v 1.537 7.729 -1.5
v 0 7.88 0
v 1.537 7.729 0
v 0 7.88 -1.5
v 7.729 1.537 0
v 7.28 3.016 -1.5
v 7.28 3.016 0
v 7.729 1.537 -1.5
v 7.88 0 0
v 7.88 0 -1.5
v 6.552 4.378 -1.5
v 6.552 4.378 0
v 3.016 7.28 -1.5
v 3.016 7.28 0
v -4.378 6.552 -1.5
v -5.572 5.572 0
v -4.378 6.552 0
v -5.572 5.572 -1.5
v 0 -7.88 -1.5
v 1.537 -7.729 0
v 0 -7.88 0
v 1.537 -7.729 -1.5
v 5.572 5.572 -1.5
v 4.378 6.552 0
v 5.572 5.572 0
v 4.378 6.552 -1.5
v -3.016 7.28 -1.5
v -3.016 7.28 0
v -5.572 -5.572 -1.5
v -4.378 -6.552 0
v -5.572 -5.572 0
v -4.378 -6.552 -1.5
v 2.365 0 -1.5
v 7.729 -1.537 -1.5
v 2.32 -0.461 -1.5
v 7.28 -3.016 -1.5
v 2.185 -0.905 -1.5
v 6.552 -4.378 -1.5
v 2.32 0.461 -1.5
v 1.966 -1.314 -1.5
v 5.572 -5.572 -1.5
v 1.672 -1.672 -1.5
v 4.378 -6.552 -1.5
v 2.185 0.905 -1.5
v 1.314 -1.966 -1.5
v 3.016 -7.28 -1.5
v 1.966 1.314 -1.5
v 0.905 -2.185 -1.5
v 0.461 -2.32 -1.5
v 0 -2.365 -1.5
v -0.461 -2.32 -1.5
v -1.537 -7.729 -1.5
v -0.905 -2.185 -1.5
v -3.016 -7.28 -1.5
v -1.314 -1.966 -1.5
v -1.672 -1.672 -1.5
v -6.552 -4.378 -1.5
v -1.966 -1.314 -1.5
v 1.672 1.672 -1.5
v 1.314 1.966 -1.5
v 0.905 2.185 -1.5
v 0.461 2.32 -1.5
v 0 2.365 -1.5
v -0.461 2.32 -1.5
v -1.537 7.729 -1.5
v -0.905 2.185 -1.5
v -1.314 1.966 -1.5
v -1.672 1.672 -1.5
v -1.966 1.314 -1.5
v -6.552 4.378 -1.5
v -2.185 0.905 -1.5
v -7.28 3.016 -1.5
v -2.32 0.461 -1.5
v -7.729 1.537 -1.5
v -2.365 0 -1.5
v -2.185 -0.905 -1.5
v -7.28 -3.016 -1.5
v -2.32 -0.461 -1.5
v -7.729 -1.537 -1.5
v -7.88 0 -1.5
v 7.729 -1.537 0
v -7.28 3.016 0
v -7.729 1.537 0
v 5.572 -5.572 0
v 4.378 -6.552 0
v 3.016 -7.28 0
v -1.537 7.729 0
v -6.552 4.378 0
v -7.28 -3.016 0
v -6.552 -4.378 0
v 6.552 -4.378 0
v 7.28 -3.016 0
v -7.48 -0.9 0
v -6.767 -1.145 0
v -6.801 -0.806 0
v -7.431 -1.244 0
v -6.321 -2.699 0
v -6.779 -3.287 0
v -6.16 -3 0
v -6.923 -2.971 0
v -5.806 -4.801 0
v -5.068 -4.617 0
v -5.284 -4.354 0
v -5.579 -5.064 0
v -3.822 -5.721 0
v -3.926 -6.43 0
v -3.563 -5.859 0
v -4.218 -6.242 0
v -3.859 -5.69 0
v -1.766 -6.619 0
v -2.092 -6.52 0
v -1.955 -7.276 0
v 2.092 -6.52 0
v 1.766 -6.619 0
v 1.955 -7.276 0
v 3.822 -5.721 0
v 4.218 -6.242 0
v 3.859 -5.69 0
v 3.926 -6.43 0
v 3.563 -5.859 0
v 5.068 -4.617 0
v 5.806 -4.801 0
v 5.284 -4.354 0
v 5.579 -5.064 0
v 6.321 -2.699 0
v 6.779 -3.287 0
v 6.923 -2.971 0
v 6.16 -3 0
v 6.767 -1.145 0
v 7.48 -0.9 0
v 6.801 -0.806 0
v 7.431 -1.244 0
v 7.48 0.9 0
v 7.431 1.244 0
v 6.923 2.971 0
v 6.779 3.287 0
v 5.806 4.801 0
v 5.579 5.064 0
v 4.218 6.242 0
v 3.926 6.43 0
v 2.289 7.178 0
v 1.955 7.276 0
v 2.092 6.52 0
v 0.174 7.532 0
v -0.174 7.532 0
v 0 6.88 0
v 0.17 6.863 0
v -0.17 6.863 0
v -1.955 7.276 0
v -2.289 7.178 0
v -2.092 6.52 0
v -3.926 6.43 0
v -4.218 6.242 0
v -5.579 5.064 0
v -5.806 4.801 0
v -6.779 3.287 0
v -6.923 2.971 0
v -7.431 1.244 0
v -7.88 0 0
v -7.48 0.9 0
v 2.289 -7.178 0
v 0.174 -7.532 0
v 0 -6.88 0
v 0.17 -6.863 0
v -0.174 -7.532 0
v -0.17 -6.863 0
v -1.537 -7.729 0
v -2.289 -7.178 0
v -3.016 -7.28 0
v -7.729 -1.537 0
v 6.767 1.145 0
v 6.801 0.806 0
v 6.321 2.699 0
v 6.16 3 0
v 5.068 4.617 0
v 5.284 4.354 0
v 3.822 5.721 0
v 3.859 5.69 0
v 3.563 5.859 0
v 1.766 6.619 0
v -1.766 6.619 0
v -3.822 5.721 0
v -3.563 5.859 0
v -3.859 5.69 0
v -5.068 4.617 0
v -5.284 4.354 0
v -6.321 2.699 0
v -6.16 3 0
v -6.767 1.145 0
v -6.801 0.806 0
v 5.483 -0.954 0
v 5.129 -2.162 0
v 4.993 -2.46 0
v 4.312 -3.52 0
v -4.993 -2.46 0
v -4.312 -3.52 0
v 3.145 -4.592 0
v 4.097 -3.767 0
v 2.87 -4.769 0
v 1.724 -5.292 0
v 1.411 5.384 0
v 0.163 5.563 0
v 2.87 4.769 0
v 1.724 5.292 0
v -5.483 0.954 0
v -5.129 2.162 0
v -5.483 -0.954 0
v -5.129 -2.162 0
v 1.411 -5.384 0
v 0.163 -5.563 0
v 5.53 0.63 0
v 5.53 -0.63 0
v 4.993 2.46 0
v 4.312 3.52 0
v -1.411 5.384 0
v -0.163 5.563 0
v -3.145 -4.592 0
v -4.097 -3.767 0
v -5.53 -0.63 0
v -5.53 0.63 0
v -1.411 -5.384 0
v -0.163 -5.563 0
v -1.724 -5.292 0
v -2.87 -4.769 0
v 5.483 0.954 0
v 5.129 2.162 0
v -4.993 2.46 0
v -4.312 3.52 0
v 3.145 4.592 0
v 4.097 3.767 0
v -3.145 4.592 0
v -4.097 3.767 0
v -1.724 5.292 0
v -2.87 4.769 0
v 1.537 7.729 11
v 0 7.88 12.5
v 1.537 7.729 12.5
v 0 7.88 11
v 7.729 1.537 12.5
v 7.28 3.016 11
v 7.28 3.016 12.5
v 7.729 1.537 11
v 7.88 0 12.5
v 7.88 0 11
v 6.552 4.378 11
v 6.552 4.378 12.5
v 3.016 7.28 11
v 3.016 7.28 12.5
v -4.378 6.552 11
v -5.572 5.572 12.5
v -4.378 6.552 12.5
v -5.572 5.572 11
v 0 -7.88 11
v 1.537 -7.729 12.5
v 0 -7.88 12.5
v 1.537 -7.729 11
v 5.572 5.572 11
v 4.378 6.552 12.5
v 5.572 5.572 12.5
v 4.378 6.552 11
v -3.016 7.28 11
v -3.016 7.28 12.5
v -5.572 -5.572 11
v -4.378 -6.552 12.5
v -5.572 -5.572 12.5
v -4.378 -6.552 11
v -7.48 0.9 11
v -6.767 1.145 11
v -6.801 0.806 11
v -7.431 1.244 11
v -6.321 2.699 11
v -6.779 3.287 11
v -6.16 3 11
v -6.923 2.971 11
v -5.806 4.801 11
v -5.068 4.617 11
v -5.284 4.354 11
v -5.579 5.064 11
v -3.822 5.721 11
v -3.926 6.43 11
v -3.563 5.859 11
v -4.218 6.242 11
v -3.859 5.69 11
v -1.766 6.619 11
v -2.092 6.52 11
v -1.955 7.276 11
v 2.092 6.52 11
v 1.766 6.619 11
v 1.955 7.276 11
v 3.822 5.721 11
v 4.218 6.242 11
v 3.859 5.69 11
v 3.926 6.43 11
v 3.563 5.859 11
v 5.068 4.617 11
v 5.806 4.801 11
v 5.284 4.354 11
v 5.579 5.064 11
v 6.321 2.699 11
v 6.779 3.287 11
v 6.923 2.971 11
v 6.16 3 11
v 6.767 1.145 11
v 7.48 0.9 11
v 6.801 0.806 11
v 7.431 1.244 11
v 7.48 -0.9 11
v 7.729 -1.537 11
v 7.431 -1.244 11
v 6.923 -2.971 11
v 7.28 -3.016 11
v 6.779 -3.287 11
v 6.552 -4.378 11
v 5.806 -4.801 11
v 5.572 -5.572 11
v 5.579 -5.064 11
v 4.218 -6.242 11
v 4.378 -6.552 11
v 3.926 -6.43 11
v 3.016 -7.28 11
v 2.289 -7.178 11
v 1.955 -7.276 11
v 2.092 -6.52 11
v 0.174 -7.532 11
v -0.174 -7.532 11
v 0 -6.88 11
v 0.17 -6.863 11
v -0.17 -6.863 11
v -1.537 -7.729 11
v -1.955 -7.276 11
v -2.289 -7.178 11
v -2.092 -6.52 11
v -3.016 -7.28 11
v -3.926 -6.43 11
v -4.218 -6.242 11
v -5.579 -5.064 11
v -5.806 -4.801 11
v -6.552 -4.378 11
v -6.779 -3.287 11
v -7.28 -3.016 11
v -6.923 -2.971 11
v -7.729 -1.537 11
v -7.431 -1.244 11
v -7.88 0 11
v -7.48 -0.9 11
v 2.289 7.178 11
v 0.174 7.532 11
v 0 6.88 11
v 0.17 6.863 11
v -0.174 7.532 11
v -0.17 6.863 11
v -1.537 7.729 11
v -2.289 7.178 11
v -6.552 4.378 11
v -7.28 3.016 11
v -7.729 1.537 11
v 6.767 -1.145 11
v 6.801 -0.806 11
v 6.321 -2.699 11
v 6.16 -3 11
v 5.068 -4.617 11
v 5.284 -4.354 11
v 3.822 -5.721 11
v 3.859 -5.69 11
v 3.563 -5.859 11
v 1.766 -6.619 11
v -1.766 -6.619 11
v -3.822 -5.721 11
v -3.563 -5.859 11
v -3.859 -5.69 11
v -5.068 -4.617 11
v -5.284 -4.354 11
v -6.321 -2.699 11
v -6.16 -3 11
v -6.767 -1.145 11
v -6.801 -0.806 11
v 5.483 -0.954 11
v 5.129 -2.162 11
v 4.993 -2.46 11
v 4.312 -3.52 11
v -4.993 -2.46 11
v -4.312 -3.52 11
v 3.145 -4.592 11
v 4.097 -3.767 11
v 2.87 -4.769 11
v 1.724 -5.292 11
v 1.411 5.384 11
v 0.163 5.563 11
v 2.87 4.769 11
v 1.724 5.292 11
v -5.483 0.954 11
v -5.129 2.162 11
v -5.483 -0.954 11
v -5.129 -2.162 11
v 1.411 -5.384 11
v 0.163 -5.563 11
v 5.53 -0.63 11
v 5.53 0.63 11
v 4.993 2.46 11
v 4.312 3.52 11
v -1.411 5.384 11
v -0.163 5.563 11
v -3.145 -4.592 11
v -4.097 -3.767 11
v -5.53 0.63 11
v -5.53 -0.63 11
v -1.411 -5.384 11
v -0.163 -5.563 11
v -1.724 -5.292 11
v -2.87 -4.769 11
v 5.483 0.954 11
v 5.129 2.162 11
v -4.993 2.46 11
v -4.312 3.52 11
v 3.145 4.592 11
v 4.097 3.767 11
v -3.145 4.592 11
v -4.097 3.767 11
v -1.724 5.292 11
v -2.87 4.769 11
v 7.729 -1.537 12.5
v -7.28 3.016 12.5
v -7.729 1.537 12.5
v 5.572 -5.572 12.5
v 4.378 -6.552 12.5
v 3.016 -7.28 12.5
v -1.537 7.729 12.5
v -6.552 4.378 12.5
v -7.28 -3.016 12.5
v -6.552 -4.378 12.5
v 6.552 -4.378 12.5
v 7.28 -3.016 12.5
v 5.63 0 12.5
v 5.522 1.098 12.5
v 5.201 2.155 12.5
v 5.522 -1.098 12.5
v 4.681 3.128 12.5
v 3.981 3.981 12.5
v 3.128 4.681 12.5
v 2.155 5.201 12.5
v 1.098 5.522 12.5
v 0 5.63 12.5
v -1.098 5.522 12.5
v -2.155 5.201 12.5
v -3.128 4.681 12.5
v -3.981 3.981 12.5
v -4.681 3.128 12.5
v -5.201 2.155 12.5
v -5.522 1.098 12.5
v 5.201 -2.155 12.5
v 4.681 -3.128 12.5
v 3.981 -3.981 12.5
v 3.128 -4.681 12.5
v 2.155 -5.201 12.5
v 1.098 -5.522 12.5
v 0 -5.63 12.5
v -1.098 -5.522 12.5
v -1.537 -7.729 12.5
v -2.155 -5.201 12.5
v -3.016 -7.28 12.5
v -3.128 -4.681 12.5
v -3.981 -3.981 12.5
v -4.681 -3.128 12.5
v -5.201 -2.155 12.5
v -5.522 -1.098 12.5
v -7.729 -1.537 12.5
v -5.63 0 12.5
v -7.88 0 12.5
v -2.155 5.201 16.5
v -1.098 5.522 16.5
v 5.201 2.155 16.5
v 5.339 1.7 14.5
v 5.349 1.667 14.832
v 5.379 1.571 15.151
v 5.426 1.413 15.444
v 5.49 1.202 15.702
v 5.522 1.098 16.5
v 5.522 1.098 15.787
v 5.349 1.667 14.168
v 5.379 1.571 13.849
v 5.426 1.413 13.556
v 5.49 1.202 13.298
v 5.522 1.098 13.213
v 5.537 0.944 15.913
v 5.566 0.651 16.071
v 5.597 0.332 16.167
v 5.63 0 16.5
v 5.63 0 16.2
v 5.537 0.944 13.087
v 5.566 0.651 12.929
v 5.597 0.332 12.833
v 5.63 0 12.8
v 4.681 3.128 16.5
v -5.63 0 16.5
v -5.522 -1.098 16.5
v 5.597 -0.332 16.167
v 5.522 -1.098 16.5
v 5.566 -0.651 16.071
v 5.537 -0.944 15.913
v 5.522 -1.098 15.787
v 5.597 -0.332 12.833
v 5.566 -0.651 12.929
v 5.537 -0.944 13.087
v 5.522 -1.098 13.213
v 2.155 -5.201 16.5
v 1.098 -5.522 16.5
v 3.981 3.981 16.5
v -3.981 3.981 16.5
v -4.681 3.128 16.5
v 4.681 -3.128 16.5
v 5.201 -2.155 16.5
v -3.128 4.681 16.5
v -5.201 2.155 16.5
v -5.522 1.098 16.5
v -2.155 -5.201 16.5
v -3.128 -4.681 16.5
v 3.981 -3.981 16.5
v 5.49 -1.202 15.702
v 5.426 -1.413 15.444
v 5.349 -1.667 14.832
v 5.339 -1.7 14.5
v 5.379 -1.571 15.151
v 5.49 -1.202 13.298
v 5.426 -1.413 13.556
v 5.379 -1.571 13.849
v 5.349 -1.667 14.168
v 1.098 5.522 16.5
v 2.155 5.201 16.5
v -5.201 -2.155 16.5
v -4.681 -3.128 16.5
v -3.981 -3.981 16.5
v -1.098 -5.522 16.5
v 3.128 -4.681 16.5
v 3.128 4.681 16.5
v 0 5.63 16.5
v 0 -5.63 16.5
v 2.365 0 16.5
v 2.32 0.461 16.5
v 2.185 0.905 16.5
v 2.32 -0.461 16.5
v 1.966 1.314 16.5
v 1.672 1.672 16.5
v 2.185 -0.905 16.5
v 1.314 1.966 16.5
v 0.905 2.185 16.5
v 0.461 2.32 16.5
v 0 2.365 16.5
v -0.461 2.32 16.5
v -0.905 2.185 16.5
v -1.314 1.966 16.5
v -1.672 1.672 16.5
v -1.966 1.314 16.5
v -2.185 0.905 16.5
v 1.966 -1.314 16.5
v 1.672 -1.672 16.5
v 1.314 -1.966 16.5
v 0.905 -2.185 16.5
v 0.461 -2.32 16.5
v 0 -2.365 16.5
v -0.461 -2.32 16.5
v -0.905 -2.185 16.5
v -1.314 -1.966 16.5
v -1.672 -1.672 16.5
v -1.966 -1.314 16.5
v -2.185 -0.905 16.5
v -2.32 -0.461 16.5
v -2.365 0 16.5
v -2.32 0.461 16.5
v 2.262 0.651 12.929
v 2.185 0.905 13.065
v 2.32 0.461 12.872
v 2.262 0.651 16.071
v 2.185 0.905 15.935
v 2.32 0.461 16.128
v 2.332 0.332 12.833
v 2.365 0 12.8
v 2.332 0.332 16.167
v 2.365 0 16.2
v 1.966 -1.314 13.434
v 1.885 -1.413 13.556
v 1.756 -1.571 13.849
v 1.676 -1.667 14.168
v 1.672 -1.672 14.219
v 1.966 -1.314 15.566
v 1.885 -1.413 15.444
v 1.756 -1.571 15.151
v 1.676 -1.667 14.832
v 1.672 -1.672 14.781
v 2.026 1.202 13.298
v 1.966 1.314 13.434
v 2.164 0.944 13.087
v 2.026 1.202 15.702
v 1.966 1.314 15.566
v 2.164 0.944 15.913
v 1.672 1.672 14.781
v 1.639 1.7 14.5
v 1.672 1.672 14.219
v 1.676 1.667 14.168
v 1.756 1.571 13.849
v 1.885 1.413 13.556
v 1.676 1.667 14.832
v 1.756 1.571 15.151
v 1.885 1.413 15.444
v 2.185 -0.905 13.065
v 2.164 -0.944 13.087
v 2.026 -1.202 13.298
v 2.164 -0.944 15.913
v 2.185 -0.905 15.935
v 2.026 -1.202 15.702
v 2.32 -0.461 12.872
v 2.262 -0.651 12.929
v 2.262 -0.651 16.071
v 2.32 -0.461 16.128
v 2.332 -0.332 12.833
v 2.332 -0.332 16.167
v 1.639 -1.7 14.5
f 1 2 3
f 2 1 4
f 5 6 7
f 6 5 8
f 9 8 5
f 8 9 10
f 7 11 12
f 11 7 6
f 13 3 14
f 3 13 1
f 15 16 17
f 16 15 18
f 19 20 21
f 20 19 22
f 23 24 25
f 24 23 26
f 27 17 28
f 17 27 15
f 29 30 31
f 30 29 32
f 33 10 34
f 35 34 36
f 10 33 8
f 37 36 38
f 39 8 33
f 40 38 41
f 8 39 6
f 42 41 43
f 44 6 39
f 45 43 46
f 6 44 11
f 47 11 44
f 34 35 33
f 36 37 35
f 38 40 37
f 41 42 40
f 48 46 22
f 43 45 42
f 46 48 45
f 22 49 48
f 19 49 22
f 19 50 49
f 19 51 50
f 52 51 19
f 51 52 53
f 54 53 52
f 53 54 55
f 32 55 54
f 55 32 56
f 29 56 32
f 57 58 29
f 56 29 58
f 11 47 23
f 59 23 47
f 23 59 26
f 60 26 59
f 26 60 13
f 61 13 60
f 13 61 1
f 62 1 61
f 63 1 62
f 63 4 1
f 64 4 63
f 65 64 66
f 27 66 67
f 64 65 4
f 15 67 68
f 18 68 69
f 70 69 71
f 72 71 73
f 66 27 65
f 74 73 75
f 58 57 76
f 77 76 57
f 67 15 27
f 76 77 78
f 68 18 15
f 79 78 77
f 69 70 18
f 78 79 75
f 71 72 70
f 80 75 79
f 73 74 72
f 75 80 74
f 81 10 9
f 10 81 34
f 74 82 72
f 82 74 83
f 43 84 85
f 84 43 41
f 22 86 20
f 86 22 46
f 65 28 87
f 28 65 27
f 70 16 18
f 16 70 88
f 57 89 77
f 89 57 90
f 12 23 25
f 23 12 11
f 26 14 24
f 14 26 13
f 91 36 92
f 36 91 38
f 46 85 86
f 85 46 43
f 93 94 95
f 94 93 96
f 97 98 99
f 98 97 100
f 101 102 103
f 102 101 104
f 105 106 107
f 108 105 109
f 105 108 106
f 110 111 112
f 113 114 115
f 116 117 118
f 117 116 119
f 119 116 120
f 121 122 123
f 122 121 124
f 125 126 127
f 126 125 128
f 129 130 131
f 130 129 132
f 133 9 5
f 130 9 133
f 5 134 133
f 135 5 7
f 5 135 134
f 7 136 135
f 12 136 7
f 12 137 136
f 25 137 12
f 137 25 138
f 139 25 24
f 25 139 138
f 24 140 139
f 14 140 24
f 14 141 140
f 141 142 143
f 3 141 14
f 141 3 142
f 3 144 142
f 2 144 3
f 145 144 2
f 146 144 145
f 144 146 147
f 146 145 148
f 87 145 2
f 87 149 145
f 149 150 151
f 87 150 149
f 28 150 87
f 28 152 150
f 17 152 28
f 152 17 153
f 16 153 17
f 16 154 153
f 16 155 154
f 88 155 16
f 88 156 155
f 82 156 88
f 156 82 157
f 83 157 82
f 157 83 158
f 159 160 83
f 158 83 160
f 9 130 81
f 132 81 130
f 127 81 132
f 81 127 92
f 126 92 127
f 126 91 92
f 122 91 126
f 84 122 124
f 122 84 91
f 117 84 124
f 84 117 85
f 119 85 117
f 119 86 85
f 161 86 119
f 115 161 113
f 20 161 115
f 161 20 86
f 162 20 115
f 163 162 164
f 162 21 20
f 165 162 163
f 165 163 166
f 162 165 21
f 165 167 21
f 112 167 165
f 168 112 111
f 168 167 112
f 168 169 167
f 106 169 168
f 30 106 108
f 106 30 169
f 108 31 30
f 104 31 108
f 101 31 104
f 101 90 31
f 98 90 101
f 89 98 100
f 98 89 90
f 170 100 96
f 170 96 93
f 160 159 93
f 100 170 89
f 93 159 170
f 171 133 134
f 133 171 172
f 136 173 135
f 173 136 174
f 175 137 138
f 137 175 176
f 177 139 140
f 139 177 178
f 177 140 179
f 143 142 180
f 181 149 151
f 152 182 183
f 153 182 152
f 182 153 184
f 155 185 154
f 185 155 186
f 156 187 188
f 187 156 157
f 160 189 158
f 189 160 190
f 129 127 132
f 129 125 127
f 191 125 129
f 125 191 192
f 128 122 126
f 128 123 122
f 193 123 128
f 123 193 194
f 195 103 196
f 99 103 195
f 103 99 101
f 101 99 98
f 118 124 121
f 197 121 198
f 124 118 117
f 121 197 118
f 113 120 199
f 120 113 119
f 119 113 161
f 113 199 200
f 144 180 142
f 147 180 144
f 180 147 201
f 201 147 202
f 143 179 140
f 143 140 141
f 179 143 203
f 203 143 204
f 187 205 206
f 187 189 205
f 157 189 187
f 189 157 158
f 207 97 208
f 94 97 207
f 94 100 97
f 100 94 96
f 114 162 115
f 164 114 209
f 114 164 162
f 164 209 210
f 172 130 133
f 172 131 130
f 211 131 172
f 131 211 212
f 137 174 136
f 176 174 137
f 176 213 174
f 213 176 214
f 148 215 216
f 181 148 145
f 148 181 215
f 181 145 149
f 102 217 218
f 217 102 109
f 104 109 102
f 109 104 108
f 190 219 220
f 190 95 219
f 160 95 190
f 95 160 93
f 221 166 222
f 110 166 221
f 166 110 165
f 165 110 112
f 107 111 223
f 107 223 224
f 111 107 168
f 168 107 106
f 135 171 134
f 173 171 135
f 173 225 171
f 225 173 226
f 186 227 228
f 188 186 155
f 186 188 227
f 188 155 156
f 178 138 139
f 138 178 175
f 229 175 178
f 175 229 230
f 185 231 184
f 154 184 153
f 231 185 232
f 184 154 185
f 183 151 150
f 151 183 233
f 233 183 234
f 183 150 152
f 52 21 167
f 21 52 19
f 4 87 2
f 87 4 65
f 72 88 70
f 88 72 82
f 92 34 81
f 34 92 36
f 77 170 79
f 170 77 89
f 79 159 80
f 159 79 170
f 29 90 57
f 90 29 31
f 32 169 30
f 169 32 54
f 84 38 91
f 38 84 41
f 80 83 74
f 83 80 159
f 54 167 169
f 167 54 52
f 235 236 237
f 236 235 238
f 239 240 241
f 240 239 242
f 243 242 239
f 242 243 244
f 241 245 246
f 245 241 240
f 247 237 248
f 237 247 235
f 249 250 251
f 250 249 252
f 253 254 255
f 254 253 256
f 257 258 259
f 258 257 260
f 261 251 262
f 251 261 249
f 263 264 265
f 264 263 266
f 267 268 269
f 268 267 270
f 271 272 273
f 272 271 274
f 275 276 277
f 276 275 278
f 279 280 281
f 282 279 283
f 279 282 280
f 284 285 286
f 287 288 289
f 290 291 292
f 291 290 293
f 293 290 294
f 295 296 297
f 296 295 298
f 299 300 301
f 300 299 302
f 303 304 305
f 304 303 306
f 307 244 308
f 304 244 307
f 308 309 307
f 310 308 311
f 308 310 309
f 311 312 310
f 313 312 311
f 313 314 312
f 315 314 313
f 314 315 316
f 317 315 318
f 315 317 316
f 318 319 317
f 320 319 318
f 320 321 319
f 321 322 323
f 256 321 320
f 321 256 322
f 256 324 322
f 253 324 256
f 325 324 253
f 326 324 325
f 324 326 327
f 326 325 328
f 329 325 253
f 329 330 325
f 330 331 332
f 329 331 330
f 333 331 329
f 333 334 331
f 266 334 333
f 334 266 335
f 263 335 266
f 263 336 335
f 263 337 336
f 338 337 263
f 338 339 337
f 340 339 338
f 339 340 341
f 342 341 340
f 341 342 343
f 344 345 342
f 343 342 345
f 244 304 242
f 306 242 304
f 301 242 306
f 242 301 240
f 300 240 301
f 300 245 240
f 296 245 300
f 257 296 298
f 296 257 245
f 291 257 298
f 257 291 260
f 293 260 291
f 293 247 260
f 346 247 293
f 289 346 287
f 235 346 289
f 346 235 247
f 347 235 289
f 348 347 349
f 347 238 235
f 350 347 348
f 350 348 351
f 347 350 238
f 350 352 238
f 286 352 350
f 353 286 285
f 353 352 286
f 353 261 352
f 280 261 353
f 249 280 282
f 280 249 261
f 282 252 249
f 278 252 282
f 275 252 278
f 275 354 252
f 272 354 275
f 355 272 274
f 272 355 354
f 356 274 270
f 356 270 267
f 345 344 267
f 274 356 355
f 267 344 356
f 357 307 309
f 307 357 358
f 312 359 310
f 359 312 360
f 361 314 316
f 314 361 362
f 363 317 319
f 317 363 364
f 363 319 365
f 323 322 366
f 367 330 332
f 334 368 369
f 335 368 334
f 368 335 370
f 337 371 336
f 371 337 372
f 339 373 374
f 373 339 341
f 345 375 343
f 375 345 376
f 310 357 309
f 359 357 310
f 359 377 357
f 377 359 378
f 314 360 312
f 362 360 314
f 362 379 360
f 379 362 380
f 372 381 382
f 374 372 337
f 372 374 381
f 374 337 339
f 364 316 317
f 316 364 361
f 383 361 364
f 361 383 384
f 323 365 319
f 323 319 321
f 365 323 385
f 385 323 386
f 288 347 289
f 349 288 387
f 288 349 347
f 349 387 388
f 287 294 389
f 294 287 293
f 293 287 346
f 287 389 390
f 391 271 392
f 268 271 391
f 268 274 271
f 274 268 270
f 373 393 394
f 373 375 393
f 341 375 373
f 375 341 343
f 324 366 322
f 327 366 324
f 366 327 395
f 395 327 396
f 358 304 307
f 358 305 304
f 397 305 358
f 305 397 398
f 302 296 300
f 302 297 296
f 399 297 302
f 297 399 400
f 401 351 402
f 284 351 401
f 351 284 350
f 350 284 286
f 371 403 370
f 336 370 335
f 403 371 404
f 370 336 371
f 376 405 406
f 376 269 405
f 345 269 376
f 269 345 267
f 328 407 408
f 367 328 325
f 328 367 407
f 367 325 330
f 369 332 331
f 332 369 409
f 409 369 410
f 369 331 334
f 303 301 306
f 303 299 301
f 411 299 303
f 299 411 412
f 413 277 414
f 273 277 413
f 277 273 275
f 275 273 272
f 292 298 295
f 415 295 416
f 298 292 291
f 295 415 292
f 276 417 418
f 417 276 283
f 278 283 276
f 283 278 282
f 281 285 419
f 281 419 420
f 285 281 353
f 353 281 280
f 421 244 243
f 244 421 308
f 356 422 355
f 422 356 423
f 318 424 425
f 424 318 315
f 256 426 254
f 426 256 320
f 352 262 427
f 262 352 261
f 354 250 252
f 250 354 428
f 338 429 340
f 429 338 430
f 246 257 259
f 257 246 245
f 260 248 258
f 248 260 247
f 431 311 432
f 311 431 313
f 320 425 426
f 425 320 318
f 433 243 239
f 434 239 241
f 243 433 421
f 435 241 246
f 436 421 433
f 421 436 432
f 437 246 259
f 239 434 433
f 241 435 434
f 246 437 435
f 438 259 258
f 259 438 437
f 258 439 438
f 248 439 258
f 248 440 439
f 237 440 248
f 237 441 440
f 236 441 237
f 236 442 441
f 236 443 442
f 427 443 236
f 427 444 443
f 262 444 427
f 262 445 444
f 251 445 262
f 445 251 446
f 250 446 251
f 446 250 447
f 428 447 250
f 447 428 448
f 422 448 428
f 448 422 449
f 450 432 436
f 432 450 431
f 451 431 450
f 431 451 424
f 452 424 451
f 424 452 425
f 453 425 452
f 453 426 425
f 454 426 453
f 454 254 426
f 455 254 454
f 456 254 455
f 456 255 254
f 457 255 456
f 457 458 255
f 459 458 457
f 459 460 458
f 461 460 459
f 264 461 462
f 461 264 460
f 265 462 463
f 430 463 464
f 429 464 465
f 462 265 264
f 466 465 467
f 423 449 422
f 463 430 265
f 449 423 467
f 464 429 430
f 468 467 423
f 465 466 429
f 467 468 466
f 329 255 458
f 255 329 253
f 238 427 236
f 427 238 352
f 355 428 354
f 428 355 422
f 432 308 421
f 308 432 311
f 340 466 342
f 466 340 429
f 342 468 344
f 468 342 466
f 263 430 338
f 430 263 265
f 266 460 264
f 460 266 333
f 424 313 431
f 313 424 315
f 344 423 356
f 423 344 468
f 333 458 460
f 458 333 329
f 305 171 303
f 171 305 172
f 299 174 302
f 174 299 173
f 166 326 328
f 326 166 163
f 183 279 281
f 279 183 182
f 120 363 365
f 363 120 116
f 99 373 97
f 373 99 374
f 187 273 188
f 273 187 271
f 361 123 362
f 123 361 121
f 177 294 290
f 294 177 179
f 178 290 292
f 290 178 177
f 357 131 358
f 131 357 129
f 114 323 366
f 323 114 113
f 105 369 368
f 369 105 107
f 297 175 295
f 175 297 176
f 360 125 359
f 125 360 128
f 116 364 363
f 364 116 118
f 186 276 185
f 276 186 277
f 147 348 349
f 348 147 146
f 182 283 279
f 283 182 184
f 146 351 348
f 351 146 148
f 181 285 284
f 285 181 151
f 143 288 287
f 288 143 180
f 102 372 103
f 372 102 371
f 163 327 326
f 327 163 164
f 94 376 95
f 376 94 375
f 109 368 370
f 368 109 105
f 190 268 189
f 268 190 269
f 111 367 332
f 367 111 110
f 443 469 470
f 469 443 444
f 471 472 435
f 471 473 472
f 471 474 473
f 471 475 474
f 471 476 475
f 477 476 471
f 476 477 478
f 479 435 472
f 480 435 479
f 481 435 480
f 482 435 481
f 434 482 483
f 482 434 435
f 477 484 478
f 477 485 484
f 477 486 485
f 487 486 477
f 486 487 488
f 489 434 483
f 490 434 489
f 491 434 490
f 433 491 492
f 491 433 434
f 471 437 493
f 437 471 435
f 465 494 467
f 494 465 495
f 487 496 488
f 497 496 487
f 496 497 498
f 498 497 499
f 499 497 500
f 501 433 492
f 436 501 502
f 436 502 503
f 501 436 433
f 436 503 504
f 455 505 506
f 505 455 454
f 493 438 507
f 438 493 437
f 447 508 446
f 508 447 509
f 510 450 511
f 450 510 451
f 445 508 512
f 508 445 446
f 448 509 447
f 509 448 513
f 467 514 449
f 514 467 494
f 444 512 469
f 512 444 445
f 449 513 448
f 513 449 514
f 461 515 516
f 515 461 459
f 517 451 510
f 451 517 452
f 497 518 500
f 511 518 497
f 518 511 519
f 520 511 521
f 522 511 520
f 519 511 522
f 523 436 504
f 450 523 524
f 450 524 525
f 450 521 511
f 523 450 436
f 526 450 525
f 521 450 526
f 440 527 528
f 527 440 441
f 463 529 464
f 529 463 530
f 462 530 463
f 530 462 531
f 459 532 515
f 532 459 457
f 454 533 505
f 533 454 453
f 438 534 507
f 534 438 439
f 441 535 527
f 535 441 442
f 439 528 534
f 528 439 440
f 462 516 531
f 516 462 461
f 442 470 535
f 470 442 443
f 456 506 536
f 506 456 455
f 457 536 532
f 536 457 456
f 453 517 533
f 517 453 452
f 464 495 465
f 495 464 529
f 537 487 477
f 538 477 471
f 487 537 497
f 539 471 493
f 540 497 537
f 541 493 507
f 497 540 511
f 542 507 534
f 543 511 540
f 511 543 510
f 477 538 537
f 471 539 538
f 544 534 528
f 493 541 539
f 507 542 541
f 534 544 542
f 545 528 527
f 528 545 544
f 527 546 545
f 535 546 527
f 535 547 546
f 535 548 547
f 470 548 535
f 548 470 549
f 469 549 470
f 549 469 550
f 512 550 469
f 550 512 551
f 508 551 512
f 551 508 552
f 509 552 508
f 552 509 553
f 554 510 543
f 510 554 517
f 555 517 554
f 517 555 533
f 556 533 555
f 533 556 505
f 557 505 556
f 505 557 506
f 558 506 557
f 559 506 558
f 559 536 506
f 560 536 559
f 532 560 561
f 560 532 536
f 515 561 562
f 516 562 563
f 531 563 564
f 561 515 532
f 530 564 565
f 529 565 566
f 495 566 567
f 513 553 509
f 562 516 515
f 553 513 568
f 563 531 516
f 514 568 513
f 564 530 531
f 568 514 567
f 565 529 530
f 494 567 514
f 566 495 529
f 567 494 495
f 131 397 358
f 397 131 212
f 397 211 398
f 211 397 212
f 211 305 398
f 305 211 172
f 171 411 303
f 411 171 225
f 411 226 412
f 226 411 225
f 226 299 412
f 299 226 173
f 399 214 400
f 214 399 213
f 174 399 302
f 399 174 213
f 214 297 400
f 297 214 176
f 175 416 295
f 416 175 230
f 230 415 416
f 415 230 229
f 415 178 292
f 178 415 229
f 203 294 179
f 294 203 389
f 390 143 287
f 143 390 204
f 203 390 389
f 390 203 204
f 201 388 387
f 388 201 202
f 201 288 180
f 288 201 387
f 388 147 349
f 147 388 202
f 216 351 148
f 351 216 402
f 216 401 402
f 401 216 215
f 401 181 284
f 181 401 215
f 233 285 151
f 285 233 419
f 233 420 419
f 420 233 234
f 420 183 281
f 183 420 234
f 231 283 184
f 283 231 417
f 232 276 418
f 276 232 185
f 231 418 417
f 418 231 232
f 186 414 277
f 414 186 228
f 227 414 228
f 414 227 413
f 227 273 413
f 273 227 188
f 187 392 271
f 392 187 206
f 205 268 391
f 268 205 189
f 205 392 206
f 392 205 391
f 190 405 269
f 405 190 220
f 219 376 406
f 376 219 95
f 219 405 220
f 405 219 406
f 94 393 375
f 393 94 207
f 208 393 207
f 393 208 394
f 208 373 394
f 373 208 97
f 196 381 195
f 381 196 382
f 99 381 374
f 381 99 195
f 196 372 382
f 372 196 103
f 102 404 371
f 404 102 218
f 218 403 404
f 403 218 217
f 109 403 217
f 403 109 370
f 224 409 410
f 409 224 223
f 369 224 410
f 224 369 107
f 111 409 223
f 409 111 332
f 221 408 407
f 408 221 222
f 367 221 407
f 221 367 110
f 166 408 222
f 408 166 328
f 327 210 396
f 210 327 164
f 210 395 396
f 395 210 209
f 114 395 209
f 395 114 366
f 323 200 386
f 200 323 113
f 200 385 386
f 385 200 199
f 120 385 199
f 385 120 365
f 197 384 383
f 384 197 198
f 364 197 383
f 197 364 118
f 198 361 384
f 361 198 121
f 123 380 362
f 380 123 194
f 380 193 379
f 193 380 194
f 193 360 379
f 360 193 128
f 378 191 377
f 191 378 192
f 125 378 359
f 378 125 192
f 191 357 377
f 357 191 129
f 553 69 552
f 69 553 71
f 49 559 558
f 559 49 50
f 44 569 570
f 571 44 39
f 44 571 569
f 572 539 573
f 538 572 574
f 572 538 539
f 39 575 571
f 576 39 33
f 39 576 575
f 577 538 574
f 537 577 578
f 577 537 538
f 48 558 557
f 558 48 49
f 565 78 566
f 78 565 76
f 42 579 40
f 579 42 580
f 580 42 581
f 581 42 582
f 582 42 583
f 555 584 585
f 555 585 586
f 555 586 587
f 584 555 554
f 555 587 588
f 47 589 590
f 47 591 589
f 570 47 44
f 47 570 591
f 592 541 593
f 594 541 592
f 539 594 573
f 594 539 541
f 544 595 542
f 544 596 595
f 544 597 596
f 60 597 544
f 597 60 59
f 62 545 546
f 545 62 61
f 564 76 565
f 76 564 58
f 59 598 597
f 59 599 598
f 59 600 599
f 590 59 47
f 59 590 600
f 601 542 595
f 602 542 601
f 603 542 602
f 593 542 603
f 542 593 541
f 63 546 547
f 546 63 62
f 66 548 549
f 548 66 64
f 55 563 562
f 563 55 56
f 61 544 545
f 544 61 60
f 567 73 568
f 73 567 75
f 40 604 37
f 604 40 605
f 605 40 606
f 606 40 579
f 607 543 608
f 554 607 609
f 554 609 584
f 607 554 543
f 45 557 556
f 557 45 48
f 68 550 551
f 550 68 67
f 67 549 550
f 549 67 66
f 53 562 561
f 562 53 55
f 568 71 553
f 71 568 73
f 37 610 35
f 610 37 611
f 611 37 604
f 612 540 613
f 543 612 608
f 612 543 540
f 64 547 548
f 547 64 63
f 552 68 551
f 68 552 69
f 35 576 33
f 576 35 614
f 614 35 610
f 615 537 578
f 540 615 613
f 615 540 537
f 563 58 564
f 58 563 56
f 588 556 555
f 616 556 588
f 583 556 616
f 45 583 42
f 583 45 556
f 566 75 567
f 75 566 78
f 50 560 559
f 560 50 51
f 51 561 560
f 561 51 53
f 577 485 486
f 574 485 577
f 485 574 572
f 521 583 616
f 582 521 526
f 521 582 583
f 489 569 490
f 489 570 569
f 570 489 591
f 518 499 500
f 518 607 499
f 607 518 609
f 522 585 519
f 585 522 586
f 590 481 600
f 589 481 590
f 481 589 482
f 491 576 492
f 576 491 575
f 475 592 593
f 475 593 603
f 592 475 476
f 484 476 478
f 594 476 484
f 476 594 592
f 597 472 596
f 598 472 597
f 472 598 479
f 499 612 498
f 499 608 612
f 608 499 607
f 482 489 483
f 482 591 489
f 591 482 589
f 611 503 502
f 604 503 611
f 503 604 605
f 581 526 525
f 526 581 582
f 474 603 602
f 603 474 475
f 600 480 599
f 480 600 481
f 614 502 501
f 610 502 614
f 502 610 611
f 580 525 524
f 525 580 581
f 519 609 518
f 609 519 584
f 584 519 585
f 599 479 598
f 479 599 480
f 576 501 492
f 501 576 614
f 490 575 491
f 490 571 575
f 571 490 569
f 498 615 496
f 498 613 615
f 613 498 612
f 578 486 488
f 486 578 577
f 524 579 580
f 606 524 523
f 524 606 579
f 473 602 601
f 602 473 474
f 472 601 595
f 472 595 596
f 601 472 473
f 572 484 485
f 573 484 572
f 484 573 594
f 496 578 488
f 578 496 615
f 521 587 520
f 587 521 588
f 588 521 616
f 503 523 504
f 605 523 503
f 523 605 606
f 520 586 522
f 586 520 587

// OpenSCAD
$fn = 32;

// ----------------------------------------------------------------------
// Timing pulley: GT2 22T, pitch 2 mm, 15.76 mm x 18 mm
// ----------------------------------------------------------------------

// --- parameters (mm) ---
pitch = 2;                // belt pitch
teeth = 22;               // number of grooves
belt_w = 11;              // belt width between the flanges
tip_d = 13.76;            // tip circle diameter
root_d = 12.26;           // groove bottom diameter
groove_h = 0.75;          // groove depth
tooth_w = 1.5;            // groove width at the tip circle
flange_d = 15.76;         // flange diameter
flange_t = 1.5;           // flange thickness
spigot_d = 10.66;         // flange spigot, sunk into the rim
spigot_h = 1.2;           // spigot depth into the rim
bore_d = 4.73;            // shaft bore
hub_d = 11.26;            // hub diameter
hub_h = 4;                // hub above the flange
bottom_z = -1.5;          // lowest point of the pulley
top_z = 16.5;             // highest point of the pulley
set_d = 3.4;              // set screw tap hole

module rim() {
  cylinder(h = belt_w, d = tip_d);
}

module groove_cutter() {
  /* belt tooth groove: deeper than wide, cut through the belt width */
  translate([root_d / 2, 0, 0])
    linear_extrude(height = belt_w)
      polygon(points = [[-0.6, -tooth_w * 0.42], [groove_h + 0.6, -tooth_w * 0.6],
                        [groove_h + 0.6, tooth_w * 0.6], [-0.6, tooth_w * 0.42]]);
}

module flanges() {
  translate([0, 0, -flange_t]) cylinder(h = flange_t, d = flange_d);
  translate([0, 0, belt_w]) cylinder(h = flange_t, d = flange_d);
  translate([0, 0, -spigot_h]) cylinder(h = spigot_h + 0.6, d = spigot_d);
  translate([0, 0, belt_w - 0.6]) cylinder(h = spigot_h + 0.6, d = spigot_d);
}

module hub() {
  translate([0, 0, bottom_z]) cylinder(h = top_z - bottom_z, d = hub_d);
}

difference() {
  union() {
    rim();
    hub();
    flanges();
  }
  for (i = [0 : teeth - 1]) rotate([0, 0, i * 360 / teeth]) groove_cutter();
  translate([0, 0, bottom_z - 1]) cylinder(h = top_z - bottom_z + 2, d = bore_d);
  translate([-1, 0, top_z - hub_h * 0.5]) rotate([0, 90, 0]) cylinder(h = hub_d / 2 + 3, d = set_d);
}
